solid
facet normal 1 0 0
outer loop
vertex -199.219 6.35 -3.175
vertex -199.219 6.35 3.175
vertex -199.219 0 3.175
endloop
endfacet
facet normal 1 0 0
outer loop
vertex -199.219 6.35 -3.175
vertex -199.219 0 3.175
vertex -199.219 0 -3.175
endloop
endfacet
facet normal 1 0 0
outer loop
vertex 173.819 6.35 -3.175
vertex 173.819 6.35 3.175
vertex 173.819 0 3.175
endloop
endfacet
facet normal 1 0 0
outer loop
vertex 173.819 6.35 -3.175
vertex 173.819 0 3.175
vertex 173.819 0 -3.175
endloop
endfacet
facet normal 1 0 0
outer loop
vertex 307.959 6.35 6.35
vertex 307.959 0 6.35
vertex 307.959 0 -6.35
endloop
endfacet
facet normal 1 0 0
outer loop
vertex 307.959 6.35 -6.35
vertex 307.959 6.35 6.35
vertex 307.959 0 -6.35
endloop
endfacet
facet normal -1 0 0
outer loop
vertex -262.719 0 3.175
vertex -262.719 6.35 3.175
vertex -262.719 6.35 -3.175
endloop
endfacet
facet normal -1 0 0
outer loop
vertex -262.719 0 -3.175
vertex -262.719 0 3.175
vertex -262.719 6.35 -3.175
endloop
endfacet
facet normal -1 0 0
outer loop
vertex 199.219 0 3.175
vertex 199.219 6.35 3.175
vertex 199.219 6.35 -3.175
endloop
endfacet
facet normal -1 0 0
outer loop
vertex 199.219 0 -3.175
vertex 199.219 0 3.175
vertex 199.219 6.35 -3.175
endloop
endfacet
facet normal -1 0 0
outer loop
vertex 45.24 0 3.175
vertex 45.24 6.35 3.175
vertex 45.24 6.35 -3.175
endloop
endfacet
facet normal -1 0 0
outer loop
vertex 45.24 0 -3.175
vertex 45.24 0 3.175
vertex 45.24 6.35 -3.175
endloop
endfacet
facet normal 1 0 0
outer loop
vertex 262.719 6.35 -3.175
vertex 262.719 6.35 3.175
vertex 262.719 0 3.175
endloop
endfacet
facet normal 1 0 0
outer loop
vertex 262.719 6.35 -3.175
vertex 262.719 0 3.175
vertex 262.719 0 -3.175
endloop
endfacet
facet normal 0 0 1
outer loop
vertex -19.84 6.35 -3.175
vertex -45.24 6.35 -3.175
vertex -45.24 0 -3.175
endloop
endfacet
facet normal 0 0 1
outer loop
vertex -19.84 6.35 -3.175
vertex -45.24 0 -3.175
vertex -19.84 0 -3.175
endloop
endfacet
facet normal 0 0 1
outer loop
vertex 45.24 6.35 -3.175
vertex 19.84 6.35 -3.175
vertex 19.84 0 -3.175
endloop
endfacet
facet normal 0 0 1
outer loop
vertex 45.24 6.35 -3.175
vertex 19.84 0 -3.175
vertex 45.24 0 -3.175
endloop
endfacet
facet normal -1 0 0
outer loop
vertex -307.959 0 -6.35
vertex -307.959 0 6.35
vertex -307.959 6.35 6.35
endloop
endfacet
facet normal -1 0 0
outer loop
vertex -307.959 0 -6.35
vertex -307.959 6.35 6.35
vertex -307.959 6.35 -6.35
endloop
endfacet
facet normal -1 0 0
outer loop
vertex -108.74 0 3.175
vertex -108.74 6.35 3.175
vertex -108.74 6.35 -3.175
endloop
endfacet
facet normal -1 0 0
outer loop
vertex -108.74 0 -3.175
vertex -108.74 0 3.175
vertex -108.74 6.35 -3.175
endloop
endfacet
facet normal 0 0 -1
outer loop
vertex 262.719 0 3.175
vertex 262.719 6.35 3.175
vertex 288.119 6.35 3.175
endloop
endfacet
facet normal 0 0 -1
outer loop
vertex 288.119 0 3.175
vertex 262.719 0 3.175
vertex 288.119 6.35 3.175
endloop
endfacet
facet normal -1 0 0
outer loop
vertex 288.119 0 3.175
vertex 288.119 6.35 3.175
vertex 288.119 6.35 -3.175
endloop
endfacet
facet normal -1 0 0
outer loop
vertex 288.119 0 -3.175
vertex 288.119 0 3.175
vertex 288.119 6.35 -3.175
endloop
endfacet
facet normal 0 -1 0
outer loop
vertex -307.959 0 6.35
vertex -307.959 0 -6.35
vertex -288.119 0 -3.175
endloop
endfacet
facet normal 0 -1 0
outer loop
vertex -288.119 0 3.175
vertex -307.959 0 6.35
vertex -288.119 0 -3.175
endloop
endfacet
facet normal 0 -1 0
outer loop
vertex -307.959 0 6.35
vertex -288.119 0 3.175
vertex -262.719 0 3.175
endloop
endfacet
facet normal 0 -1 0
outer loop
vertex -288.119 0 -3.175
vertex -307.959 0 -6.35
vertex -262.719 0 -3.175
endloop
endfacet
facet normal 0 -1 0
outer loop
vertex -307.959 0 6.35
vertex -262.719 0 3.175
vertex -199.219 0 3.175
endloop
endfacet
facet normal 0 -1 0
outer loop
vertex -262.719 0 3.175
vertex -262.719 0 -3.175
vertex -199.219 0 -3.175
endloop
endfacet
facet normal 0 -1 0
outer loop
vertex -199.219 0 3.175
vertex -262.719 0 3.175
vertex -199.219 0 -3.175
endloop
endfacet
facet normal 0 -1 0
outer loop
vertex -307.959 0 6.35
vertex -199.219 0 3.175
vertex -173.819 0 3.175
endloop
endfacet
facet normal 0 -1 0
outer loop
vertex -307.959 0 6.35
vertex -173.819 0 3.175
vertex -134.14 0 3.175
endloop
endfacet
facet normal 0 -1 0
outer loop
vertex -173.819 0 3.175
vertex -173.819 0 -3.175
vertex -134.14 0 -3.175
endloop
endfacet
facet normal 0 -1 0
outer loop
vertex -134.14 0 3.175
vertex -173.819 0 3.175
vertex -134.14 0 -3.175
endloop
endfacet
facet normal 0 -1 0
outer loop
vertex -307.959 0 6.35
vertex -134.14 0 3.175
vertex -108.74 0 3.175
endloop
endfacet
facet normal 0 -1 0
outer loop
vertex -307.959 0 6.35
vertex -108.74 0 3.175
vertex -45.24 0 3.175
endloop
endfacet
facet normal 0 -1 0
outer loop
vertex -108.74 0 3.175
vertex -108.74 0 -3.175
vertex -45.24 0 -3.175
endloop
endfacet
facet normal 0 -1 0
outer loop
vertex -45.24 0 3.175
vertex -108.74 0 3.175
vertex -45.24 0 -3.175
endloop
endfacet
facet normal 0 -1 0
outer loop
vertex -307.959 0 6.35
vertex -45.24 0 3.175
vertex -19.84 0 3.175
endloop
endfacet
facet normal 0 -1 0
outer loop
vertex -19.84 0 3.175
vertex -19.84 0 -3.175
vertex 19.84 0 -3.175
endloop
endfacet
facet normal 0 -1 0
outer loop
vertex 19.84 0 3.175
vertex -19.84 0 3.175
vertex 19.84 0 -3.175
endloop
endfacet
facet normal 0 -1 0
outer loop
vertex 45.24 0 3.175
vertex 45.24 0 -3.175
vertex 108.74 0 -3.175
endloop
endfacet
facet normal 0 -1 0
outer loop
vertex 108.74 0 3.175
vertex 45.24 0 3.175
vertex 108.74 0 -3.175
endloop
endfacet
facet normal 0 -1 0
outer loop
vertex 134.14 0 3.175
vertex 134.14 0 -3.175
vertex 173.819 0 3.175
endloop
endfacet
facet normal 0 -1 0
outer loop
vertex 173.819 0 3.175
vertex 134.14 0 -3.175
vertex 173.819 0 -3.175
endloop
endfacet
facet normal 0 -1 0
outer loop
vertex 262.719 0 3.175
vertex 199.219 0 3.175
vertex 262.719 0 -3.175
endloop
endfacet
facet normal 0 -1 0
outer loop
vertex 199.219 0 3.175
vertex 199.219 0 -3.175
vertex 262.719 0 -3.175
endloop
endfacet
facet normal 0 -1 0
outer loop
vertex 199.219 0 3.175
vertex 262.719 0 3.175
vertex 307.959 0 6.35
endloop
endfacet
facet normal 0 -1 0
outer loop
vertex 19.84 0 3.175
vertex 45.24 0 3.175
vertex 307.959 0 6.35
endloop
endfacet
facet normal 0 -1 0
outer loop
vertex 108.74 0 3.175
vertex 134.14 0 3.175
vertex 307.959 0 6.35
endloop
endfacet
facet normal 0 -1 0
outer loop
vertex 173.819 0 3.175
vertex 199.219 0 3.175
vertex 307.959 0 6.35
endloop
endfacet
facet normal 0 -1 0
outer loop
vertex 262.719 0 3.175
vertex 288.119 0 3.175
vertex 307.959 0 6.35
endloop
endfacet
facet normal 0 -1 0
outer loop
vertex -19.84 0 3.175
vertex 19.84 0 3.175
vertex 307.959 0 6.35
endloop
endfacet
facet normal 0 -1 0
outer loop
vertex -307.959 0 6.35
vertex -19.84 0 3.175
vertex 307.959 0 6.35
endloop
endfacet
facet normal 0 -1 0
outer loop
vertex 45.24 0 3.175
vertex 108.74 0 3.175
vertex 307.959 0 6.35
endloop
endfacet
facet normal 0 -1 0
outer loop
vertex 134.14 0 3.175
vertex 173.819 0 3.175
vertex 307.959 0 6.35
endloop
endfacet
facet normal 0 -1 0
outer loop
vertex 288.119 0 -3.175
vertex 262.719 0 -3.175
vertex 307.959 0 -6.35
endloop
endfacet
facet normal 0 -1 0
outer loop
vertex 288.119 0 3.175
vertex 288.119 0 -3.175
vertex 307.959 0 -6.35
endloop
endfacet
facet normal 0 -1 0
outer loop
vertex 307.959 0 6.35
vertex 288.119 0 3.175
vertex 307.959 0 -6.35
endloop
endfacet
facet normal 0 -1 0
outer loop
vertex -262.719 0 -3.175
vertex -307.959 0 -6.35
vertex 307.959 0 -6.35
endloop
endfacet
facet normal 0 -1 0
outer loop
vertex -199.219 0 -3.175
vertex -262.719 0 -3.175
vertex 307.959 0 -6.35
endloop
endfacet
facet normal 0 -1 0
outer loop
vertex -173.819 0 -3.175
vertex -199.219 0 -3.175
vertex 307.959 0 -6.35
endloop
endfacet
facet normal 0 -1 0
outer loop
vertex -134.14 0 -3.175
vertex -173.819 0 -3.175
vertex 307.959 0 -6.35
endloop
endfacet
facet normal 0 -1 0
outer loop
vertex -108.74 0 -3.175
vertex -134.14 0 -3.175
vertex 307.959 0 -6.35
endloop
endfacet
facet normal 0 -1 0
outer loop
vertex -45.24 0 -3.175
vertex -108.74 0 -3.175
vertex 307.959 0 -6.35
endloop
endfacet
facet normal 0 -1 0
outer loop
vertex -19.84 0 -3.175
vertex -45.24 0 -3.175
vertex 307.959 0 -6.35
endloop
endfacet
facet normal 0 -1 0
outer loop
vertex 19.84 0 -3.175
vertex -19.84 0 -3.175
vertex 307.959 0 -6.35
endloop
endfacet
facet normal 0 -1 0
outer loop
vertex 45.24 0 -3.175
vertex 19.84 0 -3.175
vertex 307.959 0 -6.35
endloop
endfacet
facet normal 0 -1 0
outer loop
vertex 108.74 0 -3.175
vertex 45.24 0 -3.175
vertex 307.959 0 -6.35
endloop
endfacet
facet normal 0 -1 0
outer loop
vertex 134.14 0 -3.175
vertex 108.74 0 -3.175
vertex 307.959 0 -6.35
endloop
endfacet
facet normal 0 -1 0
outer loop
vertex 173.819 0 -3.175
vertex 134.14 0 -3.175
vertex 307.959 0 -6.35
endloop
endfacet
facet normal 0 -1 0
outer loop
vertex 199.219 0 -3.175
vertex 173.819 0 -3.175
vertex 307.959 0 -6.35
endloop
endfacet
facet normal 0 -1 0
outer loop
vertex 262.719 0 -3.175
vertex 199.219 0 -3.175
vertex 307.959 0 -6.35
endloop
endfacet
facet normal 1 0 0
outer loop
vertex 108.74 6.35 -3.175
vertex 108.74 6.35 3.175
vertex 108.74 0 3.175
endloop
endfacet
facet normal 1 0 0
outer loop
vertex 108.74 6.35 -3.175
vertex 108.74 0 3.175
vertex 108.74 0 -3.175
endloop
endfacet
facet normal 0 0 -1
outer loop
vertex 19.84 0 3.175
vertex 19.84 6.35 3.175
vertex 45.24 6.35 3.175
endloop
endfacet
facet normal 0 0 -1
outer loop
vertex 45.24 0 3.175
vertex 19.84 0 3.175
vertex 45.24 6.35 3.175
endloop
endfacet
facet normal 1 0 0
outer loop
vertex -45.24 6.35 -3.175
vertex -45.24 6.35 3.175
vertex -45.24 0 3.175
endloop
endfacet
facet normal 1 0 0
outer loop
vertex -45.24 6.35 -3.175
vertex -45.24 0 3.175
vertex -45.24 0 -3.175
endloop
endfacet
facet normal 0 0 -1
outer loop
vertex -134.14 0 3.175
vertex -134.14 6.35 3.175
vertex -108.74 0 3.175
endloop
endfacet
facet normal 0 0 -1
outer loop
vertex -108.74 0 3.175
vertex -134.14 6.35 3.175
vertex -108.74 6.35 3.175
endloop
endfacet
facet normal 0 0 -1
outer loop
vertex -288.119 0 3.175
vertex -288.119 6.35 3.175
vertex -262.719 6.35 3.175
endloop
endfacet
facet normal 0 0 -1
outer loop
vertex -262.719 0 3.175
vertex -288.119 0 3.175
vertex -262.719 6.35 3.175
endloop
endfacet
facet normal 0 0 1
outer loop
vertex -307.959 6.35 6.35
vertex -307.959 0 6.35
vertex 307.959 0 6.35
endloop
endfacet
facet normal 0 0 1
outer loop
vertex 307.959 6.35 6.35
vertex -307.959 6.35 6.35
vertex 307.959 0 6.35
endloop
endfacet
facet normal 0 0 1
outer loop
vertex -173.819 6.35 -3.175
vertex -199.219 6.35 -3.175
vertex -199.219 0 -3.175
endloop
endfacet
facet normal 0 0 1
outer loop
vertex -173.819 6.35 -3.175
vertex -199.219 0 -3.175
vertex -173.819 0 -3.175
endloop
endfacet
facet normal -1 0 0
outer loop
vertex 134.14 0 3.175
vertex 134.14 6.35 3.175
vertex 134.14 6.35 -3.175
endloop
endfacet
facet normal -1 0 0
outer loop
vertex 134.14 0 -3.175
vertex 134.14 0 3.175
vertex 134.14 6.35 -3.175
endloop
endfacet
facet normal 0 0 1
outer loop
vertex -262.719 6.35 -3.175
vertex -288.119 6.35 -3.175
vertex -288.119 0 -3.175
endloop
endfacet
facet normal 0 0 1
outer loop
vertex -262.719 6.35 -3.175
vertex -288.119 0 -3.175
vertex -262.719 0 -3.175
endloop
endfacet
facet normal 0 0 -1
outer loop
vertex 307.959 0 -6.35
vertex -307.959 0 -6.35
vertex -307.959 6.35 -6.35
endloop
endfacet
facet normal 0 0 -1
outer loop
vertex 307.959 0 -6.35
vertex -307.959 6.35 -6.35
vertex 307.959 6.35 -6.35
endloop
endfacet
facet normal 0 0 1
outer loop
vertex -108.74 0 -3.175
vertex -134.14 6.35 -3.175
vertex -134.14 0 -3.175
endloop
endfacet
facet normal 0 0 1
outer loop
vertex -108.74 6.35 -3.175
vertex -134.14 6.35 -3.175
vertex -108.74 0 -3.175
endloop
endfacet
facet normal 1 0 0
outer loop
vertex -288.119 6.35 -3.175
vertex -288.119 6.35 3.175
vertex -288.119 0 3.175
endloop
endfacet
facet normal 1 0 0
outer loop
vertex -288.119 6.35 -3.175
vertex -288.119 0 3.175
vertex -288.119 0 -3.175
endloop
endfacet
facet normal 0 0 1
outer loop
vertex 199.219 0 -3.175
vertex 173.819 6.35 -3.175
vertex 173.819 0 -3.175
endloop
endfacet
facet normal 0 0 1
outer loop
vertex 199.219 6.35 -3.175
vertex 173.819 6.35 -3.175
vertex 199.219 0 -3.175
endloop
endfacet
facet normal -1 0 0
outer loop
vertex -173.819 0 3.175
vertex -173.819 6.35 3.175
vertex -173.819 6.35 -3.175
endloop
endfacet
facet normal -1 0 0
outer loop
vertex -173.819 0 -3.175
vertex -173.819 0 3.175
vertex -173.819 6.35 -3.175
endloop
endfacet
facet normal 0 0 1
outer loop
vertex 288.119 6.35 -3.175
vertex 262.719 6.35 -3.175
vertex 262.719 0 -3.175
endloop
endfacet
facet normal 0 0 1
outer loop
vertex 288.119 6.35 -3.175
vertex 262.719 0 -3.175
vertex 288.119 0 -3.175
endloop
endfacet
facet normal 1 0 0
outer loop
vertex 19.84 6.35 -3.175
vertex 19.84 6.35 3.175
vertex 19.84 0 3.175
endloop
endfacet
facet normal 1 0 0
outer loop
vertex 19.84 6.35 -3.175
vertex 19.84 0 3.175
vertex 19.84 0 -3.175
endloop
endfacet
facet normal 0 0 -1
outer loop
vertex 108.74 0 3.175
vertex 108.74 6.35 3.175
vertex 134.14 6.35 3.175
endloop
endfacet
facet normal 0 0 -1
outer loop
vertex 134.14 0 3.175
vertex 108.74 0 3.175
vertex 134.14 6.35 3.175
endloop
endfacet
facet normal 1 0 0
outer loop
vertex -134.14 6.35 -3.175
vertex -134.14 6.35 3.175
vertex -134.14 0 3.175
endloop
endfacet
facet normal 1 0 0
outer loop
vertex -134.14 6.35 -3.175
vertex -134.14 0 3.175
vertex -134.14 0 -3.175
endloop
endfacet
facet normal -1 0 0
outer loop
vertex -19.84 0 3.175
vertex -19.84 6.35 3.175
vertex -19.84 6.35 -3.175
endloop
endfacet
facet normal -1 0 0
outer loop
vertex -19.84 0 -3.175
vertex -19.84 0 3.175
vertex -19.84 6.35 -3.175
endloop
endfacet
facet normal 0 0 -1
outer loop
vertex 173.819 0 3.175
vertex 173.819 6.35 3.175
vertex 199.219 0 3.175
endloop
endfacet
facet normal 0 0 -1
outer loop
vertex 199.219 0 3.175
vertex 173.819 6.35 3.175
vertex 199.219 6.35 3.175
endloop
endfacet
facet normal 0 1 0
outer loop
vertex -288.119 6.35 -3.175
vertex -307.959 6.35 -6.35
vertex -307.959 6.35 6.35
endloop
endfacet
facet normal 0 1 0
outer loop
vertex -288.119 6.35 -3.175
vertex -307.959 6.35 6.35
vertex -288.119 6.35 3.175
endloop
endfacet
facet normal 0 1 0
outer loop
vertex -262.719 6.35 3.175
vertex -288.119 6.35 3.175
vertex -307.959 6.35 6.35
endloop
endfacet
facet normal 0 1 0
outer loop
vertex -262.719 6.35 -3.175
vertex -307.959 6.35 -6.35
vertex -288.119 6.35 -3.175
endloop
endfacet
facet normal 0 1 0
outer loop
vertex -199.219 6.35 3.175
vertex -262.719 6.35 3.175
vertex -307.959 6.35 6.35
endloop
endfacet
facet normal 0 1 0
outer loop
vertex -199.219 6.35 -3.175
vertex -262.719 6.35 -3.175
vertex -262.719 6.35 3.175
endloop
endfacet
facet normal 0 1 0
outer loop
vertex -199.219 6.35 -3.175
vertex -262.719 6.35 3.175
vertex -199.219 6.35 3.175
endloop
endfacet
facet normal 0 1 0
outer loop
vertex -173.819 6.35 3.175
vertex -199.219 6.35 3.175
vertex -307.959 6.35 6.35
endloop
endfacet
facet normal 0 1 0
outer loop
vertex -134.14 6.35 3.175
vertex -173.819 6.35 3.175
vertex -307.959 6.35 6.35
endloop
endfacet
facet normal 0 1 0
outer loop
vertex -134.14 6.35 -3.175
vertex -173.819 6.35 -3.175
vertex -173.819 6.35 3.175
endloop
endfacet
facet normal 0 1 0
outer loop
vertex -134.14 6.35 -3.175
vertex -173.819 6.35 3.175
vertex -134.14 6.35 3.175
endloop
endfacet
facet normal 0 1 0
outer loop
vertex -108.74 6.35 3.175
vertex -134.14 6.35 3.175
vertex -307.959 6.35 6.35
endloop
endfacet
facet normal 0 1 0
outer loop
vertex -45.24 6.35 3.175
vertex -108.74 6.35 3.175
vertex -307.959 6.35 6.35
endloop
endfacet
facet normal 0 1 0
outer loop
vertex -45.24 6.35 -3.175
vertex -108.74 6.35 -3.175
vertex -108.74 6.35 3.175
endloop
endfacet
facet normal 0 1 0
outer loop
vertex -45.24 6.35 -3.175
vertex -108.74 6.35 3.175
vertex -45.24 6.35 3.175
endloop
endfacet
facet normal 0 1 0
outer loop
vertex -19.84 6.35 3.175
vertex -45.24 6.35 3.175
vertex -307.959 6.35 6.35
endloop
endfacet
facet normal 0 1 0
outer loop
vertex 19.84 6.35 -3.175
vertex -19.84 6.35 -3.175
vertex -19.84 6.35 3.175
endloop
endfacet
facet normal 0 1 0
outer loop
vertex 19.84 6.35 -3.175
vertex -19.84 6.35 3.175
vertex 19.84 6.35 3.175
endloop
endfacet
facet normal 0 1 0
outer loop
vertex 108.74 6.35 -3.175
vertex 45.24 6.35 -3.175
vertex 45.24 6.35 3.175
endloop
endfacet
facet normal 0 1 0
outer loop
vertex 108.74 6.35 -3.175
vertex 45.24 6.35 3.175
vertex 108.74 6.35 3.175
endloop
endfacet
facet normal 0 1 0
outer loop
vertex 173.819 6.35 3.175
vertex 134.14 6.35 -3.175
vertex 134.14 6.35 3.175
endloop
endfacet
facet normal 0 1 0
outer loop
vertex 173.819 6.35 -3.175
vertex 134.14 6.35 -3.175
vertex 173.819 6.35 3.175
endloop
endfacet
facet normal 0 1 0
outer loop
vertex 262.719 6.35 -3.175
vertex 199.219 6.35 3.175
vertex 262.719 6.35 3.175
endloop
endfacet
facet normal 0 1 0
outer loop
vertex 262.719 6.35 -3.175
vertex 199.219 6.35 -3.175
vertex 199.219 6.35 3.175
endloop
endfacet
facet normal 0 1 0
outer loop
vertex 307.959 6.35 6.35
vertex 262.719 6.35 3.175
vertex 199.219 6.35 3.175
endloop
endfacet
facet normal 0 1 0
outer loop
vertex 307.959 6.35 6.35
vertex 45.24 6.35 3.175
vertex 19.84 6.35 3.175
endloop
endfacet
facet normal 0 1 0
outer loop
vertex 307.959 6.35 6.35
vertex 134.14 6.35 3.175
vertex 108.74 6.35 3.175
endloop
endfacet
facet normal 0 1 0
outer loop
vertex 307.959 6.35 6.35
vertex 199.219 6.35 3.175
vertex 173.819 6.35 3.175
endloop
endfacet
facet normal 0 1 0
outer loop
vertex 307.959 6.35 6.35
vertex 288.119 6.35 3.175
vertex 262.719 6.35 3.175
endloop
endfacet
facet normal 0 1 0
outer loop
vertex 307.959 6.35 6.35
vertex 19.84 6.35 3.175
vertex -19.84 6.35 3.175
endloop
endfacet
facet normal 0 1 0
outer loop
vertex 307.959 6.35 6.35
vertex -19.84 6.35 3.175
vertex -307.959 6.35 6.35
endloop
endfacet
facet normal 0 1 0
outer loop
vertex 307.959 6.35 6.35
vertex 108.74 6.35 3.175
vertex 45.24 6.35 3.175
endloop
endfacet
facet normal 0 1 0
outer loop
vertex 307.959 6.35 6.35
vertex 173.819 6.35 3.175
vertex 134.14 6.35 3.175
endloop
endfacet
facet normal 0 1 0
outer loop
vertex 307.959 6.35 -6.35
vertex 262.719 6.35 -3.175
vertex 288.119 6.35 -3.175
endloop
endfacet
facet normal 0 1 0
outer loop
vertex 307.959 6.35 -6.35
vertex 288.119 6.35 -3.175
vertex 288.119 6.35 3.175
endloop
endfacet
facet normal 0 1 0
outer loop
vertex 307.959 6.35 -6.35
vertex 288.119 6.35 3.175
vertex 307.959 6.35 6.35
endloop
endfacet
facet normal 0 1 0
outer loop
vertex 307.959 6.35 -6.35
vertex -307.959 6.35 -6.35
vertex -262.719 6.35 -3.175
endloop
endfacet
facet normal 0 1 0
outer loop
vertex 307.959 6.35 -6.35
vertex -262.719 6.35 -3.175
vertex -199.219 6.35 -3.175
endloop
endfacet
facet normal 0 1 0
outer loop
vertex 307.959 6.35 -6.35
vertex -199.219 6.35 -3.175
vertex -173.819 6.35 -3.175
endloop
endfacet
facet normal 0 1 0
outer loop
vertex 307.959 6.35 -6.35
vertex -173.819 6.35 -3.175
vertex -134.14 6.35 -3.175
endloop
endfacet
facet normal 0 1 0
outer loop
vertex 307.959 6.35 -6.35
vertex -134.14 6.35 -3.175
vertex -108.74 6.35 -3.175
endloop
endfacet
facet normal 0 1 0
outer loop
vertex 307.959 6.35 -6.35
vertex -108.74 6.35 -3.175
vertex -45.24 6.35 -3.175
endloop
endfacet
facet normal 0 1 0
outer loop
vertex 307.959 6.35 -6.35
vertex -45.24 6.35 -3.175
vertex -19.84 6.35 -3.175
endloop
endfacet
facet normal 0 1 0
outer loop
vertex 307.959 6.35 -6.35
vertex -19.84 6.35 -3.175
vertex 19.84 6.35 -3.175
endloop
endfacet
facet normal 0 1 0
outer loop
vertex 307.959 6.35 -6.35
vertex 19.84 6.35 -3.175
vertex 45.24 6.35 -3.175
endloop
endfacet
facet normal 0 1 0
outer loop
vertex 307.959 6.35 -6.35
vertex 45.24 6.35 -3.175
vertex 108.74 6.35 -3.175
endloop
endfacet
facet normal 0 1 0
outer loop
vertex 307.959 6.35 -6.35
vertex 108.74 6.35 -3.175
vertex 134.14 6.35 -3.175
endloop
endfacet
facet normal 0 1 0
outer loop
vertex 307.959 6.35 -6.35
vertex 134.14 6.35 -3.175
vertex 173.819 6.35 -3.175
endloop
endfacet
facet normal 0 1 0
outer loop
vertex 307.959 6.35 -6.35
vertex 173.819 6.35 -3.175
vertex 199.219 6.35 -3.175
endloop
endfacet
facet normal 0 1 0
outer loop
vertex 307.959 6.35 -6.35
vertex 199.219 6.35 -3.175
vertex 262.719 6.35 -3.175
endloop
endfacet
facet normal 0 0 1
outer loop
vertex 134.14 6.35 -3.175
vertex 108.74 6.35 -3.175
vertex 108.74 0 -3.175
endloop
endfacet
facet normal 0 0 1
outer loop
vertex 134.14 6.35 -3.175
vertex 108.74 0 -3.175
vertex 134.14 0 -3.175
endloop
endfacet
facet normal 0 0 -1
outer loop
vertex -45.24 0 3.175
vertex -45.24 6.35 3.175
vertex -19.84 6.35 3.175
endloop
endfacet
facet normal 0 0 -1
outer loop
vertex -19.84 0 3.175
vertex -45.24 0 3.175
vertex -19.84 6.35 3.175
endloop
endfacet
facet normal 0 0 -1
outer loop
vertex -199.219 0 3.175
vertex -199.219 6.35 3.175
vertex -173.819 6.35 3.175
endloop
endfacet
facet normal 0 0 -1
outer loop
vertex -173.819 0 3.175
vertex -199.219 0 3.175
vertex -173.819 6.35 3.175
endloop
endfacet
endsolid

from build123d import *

# Parameters (mm, degrees)
SKETCH1_W           = 615.917267528
SKETCH1_H           = 12.7
BOSS_EXTRUDE1_DEPTH = 6.35
SKETCH2_W           = 25.4
SKETCH2_H           = 6.35
CUT_EXTRUDE1_DEPTH  = 7.35
LPATTERN1_COUNT     = 2
LPATTERN1_PITCH     = 307.958633764
LPATTERN1_COL_COUNT = 2
LPATTERN1_COL_PITCH = 307.958633764


with BuildPart() as part:
    # Sketch1 → Boss-Extrude1 (new body)
    with BuildSketch(Plane(origin=(0, 0, 0), x_dir=(1, 0, 0), z_dir=(0, 1, 0))):
        Rectangle(SKETCH1_W, SKETCH1_H)
    extrude(amount=BOSS_EXTRUDE1_DEPTH)

    # Sketch2 → Cut-Extrude1 (cut, through all)
    with BuildSketch(Plane(origin=(0, 6.35, 0), x_dir=(1, 0, 0), z_dir=(0, 1, 0))):
        with Locations((-32.539658441, 0)):
            Rectangle(SKETCH2_W, SKETCH2_H)
        with Locations((32.539658441, 0)):
            Rectangle(SKETCH2_W, SKETCH2_H)
        with Locations((-121.439658441, 0)):
            Rectangle(SKETCH2_W, SKETCH2_H)
        with Locations((121.439658441, 0)):
            Rectangle(SKETCH2_W, SKETCH2_H)
    cut_extrude1 = extrude(amount=-CUT_EXTRUDE1_DEPTH, mode=Mode.SUBTRACT)

    # LPattern1: Cut-Extrude1 ×2
    with Locations(*[(i * LPATTERN1_PITCH, 0, 0) for i in range(1, LPATTERN1_COUNT)]):
        add(cut_extrude1, mode=Mode.SUBTRACT)

    # LPattern1 col: Cut-Extrude1 ×2
    with Locations(*[(-i * LPATTERN1_COL_PITCH, 0, 0) for i in range(1, LPATTERN1_COL_COUNT)]):
        add(cut_extrude1, mode=Mode.SUBTRACT)


solid = part.part
